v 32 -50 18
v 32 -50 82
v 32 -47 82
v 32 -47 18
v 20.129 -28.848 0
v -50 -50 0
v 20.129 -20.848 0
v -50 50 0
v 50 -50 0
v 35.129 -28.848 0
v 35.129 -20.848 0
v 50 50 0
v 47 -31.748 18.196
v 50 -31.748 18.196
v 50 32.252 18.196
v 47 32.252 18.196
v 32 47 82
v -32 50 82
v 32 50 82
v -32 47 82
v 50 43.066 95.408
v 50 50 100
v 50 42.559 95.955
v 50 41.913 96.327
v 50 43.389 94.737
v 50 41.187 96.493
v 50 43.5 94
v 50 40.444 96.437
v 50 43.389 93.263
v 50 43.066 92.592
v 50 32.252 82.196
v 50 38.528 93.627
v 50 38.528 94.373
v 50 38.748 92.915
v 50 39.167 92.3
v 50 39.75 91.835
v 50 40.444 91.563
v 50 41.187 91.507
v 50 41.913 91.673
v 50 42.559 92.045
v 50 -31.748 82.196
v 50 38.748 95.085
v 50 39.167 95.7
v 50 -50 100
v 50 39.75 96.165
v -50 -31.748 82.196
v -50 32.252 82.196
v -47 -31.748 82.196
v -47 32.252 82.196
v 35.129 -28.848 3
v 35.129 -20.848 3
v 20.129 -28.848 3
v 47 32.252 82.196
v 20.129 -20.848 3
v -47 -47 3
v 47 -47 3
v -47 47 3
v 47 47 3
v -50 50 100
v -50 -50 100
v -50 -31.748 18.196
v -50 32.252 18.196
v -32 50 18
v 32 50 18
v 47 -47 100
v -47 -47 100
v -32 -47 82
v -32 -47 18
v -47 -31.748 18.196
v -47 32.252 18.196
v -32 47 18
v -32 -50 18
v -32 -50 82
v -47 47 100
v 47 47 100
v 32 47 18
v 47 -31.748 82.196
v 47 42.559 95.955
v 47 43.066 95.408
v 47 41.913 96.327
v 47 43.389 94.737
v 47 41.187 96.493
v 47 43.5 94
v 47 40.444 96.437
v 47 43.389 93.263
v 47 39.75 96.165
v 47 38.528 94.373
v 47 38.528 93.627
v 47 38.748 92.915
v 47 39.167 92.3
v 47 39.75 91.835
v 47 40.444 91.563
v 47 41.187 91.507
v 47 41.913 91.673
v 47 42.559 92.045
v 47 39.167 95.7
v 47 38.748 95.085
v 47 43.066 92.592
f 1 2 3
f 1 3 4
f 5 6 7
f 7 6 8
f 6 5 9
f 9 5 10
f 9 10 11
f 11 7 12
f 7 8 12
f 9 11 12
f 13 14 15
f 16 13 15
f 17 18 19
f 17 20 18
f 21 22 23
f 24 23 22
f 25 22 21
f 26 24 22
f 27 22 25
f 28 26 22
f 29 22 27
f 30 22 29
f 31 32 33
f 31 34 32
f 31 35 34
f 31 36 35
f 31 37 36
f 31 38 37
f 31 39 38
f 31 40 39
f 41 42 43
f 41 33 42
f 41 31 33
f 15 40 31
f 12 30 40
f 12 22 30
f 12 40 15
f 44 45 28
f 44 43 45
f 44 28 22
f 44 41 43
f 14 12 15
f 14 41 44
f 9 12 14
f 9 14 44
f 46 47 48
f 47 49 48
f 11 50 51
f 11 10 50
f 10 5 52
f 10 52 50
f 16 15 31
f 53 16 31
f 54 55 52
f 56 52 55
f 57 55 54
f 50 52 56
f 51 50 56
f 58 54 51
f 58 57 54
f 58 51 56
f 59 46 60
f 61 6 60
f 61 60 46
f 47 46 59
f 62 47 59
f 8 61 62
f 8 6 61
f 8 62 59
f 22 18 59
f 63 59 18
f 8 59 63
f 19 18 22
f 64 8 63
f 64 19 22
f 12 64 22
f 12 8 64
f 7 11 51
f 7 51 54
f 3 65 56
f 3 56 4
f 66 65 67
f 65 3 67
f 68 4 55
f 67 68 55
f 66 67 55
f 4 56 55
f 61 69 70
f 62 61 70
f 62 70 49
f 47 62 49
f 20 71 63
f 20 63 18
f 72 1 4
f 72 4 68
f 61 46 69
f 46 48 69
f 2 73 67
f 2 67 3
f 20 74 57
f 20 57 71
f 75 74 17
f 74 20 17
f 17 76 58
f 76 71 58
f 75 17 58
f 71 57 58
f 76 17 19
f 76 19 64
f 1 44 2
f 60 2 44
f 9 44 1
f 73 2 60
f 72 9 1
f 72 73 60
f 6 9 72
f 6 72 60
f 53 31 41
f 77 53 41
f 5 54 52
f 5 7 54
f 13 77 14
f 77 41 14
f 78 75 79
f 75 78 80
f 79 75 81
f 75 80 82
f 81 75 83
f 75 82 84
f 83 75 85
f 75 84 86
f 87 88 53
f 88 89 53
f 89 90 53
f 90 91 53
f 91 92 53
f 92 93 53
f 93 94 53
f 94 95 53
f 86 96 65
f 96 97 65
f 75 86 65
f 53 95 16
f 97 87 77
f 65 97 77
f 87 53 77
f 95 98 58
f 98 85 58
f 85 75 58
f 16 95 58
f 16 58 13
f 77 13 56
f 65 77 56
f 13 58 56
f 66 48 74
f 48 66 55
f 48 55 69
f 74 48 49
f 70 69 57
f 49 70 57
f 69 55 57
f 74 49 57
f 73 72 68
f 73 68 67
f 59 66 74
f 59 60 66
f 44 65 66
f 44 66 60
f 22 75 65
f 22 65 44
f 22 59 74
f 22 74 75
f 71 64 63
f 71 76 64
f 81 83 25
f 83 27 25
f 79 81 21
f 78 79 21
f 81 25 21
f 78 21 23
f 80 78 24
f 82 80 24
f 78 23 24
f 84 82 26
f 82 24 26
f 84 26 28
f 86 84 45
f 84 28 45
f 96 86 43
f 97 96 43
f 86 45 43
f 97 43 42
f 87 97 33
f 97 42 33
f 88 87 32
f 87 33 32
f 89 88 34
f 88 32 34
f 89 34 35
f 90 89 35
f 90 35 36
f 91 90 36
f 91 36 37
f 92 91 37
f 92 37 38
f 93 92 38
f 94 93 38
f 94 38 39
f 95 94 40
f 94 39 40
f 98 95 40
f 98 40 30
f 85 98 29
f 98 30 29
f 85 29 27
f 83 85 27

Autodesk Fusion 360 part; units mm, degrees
sketch "Sketch1" plane through (0, 0, 0) normal (0, 0, 1) x (1, 0, 0)
  line L0 (-50, 50) -> (60, 50)
  line L1 (60, 50) -> (60, -50)
  line L2 (60, -50) -> (-50, -50)
  line L3 (-50, -50) -> (-50, 50)
sketch "Sketch8" plane through (0, 0, 0) normal (0, 0, 1) x (1, 0, 0)
  line L0 (-50, 50) -> (50, 50)
  line L1 (50, 50) -> (50, -50)
  line L2 (50, -50) -> (-50, -50)
  line L3 (-50, -50) -> (-50, 50)
  line L4 (-50, 50) -> (50, -50) construction
  line L5 (50, 50) -> (-50, -50) construction
  dimension "d15" = 100
  dimension "d16" = 100
extrude "Extrude3" add sketch "Sketch8" along normal blind 100
sketch "Sketch9" plane through (0, 0, 100) normal (0, 0, 1) x (-1, 0, 0)
  line L0 (50, 50) -> (-50, 50)
  line L1 (-50, 50) -> (-50, -50)
  line L2 (-50, -50) -> (50, -50)
  line L3 (50, -50) -> (50, 50)
shell "Shell2" thickness 3 removed faces 1 at (-16.6667, 16.6667, 100)
sketch "Sketch10" plane through (50, 0, 0) normal (1, 0, 0) x (0, 1, 0)
  line L0 (-50, 0) -> (50, 0)
  line L1 (50, 0) -> (50, 100)
  line L2 (50, 100) -> (-50, 100)
  line L3 (-50, 100) -> (-50, 0)
  line L4 (32.2521, 82.1964) -> (-31.7479, 82.1964)
  line L5 (-31.7479, 82.1964) -> (-31.7479, 18.1964)
  line L6 (-31.7479, 18.1964) -> (32.2521, 18.1964)
  line L7 (32.2521, 18.1964) -> (32.2521, 82.1964)
  line L8 (32.2521, 82.1964) -> (-31.7479, 18.1964) construction
  line L9 (-31.7479, 82.1964) -> (32.2521, 18.1964) construction
  point P0 (0.2521, 50.1964)
  dimension "d20" = 64
  dimension "d21" = 64
extrude "Extrude4" cut sketch "Sketch10" against normal through all contours L4 L5 L6 L7
sketch "Sketch11" plane through (0, -50, 0) normal (0, -1, 0) x (1, 0, 0)
  line L0 (-50, 0) -> (50, 0)
  line L1 (50, 0) -> (50, 100)
  line L2 (50, 100) -> (-50, 100)
  line L3 (-50, 100) -> (-50, 0)
  line L4 (-32, 82) -> (32, 82)
  line L5 (32, 82) -> (32, 18)
  line L6 (32, 18) -> (-32, 18)
  line L7 (-32, 18) -> (-32, 82)
  line L8 (-32, 82) -> (32, 18) construction
  line L9 (32, 82) -> (-32, 18) construction
  point P0 (0, 50)
  dimension "d23" = 64
  dimension "d24" = 64
extrude "Extrude5" cut sketch "Sketch11" against normal blind 110 contours L4 L5 L6 L7
sketch "Sketch12" plane through (0, 0, 0) normal (0, 0, 1) x (1, 0, 0)
  line L0 (35.1289, -20.848) -> (20.1289, -20.848)
  line L1 (20.1289, -20.848) -> (20.1289, -28.848)
  line L2 (20.1289, -28.848) -> (35.1289, -28.848)
  line L3 (35.1289, -28.848) -> (35.1289, -20.848)
  dimension "d27" = 15
  dimension "d28" = 8
extrude "Extrude6" cut sketch "Sketch12" along normal blind 3
sketch "Sketch13" plane through (50, 0, 0) normal (1, 0, 0) x (0, 1, 0)
  line L0 (32.2521, 18.1964) -> (-31.7479, 18.1964)
  line L1 (-31.7479, 18.1964) -> (-31.7479, 82.1964)
  line L2 (-31.7479, 82.1964) -> (32.2521, 82.1964)
  line L3 (32.2521, 82.1964) -> (32.2521, 18.1964)
  line L4 (-50, 0) -> (50, 0)
  line L5 (50, 0) -> (50, 100)
  line L6 (50, 100) -> (-50, 100)
  line L7 (-50, 100) -> (-50, 0)
  circle A0 centre (41, 94) radius 2.5
  dimension "d31" = 5
extrude "Extrude7" cut sketch "Sketch13" against normal blind 3 contours A0
